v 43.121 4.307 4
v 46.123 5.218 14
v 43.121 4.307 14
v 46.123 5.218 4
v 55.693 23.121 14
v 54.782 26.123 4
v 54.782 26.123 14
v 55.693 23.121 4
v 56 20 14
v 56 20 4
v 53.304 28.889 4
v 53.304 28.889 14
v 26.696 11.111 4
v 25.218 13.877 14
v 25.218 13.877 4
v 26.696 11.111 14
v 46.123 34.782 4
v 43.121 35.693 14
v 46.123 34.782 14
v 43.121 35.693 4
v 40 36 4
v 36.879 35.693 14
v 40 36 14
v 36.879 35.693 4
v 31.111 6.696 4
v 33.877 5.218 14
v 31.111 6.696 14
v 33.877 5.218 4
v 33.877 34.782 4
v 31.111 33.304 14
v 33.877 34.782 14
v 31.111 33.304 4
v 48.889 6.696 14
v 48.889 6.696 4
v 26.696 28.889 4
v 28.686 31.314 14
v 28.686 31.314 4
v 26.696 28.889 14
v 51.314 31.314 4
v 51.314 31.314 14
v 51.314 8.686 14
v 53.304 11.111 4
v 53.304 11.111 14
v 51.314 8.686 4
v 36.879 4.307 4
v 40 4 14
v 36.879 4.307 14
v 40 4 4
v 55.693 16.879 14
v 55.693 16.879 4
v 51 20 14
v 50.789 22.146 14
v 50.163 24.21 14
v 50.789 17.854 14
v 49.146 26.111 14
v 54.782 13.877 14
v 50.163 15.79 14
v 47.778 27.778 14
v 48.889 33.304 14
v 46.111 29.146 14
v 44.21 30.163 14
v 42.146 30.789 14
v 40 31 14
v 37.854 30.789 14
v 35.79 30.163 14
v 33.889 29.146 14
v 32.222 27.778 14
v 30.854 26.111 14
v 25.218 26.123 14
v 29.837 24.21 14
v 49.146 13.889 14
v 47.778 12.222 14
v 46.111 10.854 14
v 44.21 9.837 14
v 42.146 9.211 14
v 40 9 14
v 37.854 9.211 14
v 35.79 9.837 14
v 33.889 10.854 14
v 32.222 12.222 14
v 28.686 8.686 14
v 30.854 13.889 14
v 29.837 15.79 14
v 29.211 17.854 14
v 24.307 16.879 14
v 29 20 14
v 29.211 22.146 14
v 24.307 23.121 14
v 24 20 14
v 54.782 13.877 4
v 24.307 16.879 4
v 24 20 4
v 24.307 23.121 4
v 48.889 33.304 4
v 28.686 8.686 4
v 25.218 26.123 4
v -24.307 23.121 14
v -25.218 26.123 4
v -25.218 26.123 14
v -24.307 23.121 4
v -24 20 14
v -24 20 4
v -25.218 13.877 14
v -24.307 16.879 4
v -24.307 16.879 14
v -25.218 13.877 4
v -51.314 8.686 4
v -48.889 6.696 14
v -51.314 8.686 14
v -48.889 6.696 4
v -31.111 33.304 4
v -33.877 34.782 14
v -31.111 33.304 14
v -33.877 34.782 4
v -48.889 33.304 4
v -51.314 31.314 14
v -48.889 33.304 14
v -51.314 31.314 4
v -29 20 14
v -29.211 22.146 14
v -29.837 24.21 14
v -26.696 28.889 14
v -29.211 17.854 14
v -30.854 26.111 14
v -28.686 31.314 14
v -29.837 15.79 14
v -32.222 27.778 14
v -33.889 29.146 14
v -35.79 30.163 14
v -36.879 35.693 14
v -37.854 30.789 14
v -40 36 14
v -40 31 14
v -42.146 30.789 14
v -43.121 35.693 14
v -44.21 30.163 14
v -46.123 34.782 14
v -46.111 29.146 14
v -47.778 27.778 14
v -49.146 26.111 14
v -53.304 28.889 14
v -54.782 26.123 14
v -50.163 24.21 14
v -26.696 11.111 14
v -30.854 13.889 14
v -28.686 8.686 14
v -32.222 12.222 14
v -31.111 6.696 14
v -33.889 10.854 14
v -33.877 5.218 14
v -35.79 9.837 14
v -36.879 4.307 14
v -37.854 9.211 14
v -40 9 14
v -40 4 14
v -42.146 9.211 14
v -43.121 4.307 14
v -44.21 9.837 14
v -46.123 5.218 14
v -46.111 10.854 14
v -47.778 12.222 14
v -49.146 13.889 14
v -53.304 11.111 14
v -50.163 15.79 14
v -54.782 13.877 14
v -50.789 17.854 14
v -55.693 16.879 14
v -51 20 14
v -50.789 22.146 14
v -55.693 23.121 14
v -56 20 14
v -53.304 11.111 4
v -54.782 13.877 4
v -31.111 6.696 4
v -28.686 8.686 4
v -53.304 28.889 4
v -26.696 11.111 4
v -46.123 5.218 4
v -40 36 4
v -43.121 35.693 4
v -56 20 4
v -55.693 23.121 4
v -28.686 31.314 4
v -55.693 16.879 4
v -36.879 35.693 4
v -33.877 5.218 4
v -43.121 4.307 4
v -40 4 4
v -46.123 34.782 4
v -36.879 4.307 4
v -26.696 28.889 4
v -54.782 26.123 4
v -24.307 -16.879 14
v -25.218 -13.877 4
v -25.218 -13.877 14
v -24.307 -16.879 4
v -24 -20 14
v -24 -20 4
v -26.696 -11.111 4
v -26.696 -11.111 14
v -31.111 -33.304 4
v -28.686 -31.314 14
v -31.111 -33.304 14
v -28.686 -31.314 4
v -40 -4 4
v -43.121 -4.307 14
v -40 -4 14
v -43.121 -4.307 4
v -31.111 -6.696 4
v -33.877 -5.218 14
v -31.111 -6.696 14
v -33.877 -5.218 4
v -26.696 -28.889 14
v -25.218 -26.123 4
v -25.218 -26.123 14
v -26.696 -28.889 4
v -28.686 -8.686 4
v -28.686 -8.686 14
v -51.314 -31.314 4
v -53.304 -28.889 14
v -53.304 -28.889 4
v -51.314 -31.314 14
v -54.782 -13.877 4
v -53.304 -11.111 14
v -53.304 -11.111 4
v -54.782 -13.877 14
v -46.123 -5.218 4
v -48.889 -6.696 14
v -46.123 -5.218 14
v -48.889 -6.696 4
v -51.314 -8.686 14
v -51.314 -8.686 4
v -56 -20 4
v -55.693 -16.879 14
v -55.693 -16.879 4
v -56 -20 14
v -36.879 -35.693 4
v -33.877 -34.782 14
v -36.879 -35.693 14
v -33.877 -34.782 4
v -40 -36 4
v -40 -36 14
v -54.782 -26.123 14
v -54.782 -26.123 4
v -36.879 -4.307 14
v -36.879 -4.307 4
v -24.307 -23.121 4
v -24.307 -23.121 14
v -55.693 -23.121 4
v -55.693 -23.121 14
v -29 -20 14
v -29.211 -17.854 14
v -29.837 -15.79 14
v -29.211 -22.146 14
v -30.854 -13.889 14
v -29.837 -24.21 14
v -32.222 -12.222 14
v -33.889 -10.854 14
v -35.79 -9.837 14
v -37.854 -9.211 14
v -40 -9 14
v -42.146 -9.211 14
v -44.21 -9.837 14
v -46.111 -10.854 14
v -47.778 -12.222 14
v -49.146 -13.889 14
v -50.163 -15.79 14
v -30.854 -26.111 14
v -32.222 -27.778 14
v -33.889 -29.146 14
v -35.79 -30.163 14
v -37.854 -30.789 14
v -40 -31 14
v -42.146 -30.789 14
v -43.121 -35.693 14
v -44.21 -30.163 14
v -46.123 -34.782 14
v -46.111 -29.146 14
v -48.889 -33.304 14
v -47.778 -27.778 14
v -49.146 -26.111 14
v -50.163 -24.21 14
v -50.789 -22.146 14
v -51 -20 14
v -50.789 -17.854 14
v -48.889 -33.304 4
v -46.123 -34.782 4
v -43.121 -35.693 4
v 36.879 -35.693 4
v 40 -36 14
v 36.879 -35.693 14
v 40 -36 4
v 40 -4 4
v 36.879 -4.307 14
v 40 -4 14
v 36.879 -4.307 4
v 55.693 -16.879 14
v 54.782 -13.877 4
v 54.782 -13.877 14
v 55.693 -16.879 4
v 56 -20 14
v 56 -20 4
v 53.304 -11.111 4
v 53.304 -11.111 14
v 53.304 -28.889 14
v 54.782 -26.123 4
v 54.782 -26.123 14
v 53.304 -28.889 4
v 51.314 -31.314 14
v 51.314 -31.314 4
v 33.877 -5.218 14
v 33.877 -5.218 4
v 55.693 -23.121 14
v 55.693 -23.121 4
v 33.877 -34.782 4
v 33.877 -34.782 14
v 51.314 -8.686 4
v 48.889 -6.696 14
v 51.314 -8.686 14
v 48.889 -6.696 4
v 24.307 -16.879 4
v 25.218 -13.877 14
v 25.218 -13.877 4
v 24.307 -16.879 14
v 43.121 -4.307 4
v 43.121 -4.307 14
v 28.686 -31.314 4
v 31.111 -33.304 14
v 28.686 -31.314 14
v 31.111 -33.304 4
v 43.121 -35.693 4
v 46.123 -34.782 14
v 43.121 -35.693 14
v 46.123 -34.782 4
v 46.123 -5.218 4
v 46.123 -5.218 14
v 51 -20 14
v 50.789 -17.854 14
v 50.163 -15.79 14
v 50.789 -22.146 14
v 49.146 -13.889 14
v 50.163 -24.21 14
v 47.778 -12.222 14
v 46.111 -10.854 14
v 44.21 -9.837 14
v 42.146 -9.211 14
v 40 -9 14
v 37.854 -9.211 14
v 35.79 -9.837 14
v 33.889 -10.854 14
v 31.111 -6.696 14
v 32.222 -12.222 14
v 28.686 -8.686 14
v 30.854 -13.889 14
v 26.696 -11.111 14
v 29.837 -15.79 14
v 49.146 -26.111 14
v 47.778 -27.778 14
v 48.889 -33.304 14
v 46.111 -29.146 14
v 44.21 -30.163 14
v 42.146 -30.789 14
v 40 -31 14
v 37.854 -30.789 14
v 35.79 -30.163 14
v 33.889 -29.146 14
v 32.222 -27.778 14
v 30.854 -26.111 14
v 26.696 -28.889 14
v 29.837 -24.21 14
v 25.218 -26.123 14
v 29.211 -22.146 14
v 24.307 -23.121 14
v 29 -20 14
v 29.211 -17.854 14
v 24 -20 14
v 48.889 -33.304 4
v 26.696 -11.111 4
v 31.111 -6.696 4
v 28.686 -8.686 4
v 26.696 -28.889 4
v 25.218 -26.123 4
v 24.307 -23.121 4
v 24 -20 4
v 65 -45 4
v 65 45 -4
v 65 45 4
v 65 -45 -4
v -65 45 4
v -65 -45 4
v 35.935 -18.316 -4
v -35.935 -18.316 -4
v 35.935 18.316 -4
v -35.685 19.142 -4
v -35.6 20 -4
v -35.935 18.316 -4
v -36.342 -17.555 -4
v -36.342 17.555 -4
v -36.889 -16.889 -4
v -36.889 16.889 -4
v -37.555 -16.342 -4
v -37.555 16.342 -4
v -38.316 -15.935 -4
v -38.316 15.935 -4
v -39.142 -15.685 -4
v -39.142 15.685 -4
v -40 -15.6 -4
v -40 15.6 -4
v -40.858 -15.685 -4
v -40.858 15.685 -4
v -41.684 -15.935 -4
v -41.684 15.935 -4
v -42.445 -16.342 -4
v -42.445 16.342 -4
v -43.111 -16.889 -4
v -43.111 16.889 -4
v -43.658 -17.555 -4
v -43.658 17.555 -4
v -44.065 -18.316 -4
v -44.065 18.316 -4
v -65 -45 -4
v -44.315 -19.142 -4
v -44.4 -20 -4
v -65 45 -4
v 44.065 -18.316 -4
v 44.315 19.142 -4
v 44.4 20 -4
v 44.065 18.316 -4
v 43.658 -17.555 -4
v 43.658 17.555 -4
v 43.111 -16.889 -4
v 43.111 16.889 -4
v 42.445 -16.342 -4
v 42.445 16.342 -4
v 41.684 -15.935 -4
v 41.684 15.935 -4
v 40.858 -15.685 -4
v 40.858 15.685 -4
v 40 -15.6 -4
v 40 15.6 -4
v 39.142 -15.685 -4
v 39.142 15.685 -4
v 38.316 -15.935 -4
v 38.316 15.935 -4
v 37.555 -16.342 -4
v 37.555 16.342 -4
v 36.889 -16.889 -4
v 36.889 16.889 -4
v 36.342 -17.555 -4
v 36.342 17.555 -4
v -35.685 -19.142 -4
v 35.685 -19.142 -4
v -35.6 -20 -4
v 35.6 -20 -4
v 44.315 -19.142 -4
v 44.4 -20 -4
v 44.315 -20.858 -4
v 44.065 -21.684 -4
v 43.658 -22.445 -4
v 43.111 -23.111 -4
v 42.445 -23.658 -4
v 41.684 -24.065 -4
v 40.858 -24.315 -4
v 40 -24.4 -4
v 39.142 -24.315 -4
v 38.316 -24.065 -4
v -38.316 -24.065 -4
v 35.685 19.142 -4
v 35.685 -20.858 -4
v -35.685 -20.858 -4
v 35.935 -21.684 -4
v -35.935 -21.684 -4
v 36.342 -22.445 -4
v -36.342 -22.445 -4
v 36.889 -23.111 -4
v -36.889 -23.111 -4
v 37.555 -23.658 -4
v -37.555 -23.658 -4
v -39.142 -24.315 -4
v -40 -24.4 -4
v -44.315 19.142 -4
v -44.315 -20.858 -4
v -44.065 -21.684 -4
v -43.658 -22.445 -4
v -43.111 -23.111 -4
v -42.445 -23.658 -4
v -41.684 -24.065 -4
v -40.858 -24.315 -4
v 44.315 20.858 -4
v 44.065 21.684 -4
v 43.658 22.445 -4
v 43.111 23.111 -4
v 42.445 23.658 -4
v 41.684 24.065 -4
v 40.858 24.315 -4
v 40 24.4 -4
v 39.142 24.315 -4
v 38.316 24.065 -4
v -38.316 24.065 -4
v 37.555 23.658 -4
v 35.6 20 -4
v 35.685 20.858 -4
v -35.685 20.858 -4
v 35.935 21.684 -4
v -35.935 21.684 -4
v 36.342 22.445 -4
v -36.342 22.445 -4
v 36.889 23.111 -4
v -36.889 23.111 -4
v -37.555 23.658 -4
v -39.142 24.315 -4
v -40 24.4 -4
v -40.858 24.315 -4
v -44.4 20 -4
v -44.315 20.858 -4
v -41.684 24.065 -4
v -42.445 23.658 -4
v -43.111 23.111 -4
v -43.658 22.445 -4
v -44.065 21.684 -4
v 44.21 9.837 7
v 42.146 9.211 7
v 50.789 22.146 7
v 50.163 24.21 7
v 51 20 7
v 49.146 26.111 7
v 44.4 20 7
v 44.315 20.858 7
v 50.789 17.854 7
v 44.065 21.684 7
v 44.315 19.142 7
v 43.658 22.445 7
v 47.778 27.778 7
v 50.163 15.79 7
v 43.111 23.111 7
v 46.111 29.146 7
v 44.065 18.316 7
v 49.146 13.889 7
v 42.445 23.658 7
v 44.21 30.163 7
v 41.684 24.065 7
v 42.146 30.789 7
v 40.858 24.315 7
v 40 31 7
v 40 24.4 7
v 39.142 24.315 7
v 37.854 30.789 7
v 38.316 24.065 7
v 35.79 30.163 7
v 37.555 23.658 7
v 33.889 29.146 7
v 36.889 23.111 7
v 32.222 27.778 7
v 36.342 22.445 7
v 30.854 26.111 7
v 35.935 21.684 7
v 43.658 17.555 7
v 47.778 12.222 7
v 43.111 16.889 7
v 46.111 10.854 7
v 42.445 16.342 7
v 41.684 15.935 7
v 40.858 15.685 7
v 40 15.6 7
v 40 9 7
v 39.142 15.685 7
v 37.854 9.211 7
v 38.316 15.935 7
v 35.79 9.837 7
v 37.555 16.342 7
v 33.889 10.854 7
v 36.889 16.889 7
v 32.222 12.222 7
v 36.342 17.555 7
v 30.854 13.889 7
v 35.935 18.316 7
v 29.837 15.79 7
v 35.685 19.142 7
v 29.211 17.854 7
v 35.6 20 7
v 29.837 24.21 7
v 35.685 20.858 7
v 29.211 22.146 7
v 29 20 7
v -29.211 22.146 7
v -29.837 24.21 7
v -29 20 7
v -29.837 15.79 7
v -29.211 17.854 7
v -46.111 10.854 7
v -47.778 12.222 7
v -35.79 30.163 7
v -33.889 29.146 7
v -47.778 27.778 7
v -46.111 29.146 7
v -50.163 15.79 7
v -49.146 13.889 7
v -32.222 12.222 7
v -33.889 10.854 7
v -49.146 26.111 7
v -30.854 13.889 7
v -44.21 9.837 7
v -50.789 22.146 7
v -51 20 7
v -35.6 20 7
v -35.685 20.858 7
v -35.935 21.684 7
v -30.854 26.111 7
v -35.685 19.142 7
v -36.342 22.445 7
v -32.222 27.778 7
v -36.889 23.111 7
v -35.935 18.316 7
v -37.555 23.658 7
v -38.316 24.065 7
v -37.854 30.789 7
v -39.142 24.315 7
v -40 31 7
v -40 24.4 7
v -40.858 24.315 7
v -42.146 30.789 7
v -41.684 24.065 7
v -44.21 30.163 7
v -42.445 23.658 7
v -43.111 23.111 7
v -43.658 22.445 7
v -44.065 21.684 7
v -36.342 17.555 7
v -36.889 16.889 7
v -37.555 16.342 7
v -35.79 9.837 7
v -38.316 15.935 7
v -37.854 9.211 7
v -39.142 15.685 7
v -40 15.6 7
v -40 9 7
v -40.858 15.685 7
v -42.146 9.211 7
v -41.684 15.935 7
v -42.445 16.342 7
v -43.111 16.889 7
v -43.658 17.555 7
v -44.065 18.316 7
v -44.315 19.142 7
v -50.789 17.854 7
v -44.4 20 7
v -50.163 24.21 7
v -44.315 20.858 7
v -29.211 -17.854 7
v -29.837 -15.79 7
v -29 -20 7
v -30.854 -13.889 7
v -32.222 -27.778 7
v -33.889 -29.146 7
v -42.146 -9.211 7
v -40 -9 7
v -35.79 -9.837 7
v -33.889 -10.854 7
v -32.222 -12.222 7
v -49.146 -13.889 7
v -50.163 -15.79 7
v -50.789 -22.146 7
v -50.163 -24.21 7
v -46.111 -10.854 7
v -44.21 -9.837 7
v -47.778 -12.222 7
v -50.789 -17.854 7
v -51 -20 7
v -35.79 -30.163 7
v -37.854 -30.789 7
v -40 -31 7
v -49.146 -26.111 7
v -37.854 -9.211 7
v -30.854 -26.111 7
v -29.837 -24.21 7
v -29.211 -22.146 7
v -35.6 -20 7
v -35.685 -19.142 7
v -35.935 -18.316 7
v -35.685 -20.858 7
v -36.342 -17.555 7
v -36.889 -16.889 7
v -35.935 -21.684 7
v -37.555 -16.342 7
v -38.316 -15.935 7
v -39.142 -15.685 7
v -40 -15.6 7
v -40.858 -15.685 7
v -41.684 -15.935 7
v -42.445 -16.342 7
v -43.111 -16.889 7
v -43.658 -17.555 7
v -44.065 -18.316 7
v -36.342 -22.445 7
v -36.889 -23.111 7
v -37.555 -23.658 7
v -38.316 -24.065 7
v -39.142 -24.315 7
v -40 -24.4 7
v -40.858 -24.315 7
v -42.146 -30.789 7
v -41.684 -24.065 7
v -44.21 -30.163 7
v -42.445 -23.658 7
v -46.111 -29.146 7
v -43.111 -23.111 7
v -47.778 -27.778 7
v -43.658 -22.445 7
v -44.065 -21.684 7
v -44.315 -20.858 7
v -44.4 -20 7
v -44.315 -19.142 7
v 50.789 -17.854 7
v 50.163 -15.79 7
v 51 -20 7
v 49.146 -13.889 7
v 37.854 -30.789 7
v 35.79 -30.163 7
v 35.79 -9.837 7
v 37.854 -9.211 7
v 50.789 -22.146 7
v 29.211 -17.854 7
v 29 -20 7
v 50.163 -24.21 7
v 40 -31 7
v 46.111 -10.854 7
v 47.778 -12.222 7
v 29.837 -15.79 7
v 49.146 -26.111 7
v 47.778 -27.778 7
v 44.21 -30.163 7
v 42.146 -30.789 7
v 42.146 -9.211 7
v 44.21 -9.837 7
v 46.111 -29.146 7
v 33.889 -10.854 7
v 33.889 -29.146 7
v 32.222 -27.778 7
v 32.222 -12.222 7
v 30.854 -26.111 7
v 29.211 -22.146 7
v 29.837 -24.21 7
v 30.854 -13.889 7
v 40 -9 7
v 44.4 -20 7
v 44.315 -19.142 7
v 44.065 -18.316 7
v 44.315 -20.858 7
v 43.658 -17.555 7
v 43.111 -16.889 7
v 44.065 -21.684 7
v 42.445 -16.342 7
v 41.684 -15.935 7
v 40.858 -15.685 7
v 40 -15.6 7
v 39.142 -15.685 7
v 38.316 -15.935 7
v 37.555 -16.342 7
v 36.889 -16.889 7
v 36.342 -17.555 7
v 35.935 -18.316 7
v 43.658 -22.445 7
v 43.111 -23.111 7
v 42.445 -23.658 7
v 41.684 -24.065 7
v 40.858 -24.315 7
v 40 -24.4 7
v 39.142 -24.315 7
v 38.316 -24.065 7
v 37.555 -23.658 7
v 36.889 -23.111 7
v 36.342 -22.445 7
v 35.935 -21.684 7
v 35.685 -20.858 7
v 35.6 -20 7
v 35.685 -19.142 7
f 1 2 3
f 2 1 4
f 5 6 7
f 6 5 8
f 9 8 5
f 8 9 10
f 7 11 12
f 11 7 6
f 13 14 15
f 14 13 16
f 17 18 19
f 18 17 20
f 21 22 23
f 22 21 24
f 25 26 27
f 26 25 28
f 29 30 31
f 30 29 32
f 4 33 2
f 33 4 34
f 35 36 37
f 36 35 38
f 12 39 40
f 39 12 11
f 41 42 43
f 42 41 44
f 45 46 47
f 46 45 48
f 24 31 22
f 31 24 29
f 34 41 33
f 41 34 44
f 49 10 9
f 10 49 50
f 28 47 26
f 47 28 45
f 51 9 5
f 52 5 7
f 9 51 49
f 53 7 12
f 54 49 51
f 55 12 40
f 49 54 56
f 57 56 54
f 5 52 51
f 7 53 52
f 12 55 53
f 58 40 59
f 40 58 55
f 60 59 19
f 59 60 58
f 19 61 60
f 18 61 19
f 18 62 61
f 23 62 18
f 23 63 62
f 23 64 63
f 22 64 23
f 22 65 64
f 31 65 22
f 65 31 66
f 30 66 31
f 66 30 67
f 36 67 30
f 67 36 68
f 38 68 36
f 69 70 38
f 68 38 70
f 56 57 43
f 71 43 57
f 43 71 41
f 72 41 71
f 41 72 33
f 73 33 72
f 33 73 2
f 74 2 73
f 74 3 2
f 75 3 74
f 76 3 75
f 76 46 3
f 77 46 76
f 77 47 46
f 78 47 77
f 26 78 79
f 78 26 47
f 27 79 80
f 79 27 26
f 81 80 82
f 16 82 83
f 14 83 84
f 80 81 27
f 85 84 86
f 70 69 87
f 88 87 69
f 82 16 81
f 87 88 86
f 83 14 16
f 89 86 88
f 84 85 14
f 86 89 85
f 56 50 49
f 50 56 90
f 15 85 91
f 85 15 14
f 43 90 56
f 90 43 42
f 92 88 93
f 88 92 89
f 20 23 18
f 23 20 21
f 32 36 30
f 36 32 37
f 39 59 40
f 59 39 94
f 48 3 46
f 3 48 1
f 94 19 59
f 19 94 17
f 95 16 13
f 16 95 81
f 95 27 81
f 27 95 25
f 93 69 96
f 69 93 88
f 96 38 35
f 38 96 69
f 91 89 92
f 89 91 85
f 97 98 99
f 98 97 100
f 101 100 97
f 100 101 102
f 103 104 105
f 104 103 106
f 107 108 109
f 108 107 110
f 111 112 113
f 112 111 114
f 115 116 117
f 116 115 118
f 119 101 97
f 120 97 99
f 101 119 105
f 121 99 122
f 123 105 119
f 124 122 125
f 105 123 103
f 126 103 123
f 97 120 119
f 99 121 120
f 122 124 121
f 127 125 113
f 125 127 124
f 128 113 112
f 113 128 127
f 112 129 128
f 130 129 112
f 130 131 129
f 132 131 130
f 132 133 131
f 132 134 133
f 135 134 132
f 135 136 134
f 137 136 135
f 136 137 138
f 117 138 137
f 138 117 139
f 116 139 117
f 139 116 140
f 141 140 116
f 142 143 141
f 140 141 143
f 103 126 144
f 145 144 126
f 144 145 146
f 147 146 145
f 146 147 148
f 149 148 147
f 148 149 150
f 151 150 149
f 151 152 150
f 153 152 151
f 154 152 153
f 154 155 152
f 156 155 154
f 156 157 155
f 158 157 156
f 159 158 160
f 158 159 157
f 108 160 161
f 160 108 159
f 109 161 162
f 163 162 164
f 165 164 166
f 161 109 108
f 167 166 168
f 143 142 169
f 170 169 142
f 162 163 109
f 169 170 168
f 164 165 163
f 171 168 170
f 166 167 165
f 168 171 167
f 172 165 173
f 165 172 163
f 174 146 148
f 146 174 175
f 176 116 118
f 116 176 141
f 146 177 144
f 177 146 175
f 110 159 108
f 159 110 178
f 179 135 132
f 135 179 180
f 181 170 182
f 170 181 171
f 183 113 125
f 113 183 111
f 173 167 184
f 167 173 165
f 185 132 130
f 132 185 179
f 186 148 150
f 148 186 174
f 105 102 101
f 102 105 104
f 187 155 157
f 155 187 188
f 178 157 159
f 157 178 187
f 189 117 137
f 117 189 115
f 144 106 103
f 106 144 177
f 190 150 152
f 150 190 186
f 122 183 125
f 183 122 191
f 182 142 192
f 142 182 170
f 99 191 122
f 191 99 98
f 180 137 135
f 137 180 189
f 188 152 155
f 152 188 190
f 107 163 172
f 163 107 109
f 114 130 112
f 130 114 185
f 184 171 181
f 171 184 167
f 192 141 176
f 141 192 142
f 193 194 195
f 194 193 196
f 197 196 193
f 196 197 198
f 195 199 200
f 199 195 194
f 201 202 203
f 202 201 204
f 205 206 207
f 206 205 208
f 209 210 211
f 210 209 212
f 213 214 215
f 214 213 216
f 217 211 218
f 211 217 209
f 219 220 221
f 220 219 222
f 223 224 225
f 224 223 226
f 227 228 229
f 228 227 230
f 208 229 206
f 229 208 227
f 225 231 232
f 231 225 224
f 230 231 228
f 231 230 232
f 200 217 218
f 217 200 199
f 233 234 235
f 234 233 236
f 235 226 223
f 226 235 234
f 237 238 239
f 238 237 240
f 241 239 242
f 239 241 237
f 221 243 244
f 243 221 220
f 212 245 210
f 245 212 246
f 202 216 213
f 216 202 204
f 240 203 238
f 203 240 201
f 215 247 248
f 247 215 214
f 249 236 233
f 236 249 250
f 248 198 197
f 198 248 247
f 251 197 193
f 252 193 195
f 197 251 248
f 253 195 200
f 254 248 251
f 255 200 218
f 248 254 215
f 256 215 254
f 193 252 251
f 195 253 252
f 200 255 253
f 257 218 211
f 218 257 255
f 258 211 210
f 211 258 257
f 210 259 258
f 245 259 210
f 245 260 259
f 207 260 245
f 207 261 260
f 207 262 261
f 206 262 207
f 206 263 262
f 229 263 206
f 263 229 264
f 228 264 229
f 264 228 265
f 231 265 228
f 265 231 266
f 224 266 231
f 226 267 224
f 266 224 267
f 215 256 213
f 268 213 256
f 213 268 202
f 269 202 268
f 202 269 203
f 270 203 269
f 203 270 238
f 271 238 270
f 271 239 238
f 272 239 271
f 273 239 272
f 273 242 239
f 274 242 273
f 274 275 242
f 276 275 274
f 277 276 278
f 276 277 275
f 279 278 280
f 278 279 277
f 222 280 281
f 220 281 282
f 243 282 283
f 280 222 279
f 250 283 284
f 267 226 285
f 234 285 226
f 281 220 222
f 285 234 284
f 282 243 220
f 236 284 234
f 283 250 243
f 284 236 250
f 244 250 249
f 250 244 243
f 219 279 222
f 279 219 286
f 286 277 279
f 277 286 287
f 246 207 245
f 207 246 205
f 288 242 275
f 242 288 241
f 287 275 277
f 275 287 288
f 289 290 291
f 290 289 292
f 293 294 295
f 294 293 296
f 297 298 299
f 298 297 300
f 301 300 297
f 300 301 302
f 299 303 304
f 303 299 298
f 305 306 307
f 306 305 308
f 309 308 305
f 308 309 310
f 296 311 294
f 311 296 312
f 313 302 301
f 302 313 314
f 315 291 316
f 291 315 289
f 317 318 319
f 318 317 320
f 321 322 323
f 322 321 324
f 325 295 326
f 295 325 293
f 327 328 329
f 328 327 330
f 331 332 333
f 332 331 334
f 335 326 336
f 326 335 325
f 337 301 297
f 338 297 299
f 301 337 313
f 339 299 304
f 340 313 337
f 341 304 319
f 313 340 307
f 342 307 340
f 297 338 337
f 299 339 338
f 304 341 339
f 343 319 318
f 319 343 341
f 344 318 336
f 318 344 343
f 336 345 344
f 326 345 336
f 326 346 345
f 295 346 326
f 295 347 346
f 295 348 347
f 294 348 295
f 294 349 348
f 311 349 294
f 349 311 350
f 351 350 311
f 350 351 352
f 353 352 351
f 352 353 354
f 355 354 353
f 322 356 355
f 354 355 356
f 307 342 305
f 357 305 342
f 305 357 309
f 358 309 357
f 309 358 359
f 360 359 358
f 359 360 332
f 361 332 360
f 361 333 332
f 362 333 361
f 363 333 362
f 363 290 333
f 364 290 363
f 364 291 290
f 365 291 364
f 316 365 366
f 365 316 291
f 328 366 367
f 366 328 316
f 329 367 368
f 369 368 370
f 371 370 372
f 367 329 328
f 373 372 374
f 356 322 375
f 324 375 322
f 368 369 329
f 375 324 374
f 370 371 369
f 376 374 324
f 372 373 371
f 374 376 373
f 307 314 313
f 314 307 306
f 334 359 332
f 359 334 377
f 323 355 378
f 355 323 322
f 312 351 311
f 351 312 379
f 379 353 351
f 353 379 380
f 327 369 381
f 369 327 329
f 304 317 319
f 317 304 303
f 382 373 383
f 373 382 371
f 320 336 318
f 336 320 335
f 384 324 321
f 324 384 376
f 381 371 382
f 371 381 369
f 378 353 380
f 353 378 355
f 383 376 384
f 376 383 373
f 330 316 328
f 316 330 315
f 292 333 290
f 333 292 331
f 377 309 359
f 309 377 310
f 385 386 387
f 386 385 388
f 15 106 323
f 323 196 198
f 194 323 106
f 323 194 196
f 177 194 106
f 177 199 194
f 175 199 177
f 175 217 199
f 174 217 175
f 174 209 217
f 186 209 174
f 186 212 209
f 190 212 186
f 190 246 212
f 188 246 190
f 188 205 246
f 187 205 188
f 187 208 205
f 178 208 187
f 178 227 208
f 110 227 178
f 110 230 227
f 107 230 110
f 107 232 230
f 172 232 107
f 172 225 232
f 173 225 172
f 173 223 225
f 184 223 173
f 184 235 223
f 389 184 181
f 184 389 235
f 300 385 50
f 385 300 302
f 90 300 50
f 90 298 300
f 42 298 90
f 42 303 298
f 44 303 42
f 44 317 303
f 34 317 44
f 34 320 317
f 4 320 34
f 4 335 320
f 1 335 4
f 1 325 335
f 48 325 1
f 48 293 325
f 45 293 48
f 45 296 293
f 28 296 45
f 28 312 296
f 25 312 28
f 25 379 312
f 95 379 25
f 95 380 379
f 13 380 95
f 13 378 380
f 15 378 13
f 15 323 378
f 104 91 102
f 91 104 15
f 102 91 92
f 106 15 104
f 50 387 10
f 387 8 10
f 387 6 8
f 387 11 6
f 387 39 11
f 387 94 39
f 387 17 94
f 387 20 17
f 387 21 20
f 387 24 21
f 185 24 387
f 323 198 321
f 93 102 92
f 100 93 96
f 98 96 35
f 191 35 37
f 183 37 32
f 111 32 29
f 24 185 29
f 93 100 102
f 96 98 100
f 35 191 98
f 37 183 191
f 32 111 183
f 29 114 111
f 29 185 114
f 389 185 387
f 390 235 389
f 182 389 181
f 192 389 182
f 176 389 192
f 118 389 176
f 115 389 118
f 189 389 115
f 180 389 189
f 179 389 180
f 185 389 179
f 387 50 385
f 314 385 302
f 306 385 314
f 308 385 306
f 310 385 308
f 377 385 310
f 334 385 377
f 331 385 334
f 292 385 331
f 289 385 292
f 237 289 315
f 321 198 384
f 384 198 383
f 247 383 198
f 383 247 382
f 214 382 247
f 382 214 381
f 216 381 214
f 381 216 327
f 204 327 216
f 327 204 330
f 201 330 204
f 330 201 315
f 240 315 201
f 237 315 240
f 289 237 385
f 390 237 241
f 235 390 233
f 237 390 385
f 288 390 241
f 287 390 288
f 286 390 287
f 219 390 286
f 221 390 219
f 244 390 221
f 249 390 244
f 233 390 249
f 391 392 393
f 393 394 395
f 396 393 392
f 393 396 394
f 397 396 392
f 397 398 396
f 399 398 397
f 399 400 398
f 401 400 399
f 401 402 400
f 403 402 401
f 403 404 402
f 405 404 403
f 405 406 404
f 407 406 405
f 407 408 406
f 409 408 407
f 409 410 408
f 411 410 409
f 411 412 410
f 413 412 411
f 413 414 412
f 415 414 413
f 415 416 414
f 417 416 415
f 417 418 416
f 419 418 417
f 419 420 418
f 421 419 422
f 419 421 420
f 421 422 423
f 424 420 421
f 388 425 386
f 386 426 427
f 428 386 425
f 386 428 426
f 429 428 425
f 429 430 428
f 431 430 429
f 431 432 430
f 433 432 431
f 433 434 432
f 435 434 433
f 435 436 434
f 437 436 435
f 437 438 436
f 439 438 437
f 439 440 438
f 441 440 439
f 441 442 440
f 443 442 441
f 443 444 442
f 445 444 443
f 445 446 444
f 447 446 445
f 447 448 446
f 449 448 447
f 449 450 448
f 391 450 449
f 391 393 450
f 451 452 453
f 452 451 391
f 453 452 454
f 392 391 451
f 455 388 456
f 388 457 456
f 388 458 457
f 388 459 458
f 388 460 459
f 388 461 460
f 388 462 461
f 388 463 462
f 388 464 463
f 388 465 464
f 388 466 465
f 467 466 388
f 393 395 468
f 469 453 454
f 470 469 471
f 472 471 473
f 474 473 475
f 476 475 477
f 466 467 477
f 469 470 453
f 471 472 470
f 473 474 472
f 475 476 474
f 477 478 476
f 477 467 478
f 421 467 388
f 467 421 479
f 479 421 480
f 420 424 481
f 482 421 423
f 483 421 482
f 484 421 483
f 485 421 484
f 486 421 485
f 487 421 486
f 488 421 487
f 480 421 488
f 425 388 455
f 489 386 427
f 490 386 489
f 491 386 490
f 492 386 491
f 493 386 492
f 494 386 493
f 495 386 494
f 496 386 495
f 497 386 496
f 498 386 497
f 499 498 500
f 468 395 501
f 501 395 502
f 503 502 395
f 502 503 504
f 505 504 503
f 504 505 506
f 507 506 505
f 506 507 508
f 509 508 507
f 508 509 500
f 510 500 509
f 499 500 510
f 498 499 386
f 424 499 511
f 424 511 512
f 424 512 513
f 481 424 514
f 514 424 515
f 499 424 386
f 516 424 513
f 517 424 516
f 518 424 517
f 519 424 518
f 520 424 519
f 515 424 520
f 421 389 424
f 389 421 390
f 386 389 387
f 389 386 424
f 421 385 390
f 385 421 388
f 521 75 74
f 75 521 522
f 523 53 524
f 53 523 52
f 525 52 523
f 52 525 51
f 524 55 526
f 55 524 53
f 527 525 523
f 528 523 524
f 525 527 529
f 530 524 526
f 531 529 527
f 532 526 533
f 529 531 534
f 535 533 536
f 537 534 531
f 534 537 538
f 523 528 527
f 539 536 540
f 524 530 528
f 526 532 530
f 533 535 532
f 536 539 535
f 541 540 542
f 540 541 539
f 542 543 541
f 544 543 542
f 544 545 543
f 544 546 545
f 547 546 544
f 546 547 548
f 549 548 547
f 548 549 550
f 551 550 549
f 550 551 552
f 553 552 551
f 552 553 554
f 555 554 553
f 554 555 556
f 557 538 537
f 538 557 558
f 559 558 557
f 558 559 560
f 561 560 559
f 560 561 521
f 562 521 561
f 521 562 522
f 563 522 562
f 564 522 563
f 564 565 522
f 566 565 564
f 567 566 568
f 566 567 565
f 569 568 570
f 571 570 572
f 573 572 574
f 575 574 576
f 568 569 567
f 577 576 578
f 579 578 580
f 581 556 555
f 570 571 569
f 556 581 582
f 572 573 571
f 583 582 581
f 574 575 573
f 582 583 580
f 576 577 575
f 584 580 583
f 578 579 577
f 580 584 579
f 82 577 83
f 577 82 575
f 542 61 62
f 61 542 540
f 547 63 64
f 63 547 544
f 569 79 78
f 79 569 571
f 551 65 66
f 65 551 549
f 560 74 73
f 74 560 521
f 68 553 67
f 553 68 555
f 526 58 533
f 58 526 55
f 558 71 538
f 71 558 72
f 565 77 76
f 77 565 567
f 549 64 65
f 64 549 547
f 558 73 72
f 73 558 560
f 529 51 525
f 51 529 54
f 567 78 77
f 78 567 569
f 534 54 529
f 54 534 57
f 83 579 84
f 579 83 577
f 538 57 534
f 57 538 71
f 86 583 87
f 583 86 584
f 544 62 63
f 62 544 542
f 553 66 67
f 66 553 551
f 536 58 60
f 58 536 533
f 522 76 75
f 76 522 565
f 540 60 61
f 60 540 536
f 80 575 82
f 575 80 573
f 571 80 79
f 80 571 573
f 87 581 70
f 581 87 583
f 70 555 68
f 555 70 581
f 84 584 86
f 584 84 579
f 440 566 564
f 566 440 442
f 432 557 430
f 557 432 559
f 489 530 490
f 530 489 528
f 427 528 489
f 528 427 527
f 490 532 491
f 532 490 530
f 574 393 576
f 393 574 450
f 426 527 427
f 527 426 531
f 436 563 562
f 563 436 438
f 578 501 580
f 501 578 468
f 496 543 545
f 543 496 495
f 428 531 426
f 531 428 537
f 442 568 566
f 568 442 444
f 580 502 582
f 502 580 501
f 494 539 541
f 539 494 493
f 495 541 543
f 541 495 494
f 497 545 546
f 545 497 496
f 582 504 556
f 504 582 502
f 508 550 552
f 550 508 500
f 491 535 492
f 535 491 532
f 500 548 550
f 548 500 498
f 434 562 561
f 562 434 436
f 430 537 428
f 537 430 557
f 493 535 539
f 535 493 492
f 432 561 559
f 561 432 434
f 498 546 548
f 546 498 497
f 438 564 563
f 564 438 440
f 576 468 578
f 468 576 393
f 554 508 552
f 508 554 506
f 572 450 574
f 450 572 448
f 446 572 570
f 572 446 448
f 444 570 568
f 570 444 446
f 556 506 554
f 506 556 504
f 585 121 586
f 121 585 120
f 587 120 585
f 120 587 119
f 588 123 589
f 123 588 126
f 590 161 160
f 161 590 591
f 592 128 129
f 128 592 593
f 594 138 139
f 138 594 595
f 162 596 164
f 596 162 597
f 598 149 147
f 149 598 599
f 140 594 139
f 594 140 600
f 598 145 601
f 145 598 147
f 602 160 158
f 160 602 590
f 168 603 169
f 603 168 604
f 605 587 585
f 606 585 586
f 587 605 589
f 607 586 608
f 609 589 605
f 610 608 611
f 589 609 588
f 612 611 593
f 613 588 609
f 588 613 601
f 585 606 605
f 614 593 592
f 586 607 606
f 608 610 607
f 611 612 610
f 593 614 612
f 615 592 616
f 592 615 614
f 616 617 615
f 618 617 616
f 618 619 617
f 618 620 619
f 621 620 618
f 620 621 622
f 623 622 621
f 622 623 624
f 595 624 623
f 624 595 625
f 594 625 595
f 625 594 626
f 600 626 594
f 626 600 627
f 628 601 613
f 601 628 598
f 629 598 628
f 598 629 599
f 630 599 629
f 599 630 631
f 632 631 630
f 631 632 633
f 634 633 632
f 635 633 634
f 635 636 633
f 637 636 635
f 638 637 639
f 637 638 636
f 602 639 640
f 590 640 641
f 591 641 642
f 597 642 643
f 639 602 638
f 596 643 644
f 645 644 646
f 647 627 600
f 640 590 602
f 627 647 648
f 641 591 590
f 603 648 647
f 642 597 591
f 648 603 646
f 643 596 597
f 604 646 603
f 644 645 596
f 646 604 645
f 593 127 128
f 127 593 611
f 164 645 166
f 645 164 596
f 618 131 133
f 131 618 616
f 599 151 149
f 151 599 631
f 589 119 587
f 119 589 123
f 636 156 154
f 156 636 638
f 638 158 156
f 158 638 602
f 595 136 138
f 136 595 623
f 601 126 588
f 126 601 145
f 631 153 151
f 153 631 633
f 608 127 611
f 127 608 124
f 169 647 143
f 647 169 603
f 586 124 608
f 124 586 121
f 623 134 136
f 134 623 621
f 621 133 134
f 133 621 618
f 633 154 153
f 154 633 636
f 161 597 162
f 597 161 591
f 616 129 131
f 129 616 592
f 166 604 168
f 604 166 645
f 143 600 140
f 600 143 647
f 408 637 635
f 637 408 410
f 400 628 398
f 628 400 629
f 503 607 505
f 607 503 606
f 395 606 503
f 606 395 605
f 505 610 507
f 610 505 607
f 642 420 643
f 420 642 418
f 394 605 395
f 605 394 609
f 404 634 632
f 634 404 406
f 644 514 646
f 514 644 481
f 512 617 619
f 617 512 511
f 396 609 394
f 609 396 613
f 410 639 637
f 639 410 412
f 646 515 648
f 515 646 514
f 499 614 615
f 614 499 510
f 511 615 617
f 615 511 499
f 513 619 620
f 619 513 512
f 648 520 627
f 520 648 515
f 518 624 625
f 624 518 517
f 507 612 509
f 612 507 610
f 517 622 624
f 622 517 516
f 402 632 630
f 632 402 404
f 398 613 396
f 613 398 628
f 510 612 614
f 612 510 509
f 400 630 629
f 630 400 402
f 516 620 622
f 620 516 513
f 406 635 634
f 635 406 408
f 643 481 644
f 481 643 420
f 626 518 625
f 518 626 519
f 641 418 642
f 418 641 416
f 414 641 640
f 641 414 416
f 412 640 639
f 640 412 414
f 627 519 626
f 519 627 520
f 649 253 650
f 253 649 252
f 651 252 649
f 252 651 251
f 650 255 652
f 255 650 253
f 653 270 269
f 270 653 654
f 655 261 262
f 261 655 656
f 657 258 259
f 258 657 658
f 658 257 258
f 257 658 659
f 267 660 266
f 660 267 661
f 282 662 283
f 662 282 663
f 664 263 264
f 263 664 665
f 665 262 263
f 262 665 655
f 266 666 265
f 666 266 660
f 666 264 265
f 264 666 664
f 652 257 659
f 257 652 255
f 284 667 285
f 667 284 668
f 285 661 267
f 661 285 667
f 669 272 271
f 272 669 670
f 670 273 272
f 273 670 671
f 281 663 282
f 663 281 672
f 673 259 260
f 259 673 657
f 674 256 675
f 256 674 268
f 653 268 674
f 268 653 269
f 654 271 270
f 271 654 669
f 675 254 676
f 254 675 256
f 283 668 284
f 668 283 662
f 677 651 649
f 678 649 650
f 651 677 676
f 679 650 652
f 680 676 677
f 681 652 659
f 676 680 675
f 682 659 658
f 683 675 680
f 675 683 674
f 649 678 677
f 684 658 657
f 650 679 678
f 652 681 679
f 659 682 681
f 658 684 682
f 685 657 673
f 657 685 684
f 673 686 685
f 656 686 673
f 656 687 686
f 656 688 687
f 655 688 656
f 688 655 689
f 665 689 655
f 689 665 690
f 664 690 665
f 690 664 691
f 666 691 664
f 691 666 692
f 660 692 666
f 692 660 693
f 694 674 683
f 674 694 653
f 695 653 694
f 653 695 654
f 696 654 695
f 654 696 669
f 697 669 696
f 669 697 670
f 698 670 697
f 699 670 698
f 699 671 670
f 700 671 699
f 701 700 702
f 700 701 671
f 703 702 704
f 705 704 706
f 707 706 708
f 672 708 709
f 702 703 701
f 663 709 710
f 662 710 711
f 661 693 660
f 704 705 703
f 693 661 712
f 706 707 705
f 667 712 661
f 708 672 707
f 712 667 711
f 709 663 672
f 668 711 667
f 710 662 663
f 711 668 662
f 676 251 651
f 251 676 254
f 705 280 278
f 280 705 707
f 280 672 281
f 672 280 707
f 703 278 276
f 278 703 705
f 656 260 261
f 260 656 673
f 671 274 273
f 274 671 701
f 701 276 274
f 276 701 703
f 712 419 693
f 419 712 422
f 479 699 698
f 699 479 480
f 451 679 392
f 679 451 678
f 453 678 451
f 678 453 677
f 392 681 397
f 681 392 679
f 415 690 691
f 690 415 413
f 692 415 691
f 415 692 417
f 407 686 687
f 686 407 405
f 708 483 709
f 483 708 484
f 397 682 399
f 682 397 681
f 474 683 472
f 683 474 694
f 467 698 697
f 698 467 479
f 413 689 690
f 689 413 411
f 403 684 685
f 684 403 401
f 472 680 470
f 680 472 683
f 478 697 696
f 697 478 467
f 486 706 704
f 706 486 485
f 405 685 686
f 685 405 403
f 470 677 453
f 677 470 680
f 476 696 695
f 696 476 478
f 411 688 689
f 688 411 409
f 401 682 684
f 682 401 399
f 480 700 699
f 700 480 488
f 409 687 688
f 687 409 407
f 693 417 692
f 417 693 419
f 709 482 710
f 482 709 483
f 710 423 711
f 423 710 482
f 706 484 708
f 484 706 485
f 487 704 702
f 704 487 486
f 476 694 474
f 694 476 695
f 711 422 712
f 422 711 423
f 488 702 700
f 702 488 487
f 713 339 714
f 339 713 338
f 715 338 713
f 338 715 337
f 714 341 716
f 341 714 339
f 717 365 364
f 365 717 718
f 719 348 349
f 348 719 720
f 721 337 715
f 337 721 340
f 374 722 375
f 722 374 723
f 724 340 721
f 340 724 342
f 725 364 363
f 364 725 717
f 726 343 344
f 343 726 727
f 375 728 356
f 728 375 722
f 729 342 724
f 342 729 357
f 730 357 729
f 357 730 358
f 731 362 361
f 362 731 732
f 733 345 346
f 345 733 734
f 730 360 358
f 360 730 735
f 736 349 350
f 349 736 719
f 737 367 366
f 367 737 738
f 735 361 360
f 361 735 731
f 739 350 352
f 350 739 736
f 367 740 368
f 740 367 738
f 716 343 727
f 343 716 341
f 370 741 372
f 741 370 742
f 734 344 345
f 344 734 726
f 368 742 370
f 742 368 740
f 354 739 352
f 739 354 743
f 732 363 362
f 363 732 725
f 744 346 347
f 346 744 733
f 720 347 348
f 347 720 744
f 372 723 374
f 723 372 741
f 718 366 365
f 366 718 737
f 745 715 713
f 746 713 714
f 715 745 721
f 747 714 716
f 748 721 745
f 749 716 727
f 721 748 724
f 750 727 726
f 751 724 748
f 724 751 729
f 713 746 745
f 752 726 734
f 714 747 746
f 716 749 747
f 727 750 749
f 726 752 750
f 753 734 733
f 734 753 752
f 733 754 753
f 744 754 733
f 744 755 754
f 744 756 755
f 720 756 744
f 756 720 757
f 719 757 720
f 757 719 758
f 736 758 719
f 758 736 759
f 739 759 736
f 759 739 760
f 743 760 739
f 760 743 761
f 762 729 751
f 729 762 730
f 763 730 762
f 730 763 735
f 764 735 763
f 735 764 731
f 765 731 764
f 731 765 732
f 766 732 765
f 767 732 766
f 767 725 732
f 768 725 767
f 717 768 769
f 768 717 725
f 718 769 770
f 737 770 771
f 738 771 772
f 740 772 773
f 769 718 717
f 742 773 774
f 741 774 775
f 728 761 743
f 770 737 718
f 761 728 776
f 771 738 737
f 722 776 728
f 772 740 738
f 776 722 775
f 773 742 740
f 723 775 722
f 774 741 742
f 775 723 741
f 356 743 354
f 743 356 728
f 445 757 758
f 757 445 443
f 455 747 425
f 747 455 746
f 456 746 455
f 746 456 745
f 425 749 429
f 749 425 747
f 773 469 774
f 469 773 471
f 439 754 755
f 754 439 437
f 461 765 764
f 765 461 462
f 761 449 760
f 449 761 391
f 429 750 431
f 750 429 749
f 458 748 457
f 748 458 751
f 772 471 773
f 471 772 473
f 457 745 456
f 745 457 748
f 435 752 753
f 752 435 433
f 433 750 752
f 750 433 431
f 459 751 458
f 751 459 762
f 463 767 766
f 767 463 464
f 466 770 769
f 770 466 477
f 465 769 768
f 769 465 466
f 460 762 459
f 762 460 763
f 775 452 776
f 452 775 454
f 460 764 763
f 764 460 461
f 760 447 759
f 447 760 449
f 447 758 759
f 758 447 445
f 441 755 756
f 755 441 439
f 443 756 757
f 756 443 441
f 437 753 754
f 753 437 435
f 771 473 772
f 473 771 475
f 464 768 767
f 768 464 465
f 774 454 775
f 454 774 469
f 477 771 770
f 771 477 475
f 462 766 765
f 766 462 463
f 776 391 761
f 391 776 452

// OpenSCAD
$fn = 32;

// ----------------------------------------------------------------------
// Socket pad plate
// bosses with counterbored sockets for the screws
// ----------------------------------------------------------------------

// --- parameters (mm) ---
base_t = 8;            // base plate thickness
boss_h = 10;           // boss height above the base plate
boss_d = 32;           // boss diameter
socket_d = 22;         // socket diameter
socket_depth = 7;      // socket depth from the boss face
bolt_d = 8.8;          // screw clearance hole through the socket floor
plate = [130, 90, 8];  // overall size (x, y, z)
edge = 25;             // boss centre offset from the plate edge
pads = 4;              // boss count, one per corner

// --- derived feature positions (mm) ---
height = base_t + boss_h;        // = 18   overall height of the part
corner_x = plate[0] / 2 - edge;  // = 40   boss centre X
corner_y = plate[1] / 2 - edge;  // = 20   boss centre Y
feature_centers = [
  [corner_x, corner_y],
  [-corner_x, corner_y],
  [-corner_x, -corner_y],
  [corner_x, -corner_y]
];   // boss centres: sockets, holes and the pads themselves are placed from here

// base plate, bosses on feature_centers, socket + through hole in each
difference() {
  union() {
    cube(plate, center = true);
    for (centre = feature_centers)
      translate([centre[0], centre[1], plate[2] / 2 - 1])
        cylinder(d = boss_d, h = boss_h + 1);
  }
  for (centre = feature_centers) {
    translate([centre[0], centre[1], plate[2] / 2 + boss_h - socket_depth])
      cylinder(d = socket_d, h = socket_depth + 1);
    translate([centre[0], centre[1], -height])
      cylinder(d = bolt_d, h = 2 * height + 2);  // through the socket floor
  }
}
